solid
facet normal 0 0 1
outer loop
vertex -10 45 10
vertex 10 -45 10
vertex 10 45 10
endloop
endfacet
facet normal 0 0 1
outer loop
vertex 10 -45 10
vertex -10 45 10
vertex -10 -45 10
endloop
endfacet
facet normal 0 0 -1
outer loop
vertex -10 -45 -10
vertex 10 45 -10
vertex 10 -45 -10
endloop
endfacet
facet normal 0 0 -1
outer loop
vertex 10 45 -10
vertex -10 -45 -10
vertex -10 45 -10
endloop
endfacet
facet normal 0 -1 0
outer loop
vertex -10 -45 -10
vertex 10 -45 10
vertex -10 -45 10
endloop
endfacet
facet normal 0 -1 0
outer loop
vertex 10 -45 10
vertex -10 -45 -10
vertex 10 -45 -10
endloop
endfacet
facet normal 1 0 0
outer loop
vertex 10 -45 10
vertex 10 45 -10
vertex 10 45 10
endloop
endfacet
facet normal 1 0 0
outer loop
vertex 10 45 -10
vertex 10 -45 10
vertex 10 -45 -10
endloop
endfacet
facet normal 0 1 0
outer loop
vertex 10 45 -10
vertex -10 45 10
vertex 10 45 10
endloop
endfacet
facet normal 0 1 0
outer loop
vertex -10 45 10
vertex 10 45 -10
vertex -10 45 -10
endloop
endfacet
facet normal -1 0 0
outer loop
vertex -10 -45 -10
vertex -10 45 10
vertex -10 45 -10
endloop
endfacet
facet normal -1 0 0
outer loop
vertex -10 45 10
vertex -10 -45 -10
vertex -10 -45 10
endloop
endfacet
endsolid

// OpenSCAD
// ========================================
// a 20 x 90 x 20 mm box
// NeuroCAD canonical IR; dimensions are millimetres
// ========================================
$fn = 48;

cube(size=[20, 90, 20], center=true);
